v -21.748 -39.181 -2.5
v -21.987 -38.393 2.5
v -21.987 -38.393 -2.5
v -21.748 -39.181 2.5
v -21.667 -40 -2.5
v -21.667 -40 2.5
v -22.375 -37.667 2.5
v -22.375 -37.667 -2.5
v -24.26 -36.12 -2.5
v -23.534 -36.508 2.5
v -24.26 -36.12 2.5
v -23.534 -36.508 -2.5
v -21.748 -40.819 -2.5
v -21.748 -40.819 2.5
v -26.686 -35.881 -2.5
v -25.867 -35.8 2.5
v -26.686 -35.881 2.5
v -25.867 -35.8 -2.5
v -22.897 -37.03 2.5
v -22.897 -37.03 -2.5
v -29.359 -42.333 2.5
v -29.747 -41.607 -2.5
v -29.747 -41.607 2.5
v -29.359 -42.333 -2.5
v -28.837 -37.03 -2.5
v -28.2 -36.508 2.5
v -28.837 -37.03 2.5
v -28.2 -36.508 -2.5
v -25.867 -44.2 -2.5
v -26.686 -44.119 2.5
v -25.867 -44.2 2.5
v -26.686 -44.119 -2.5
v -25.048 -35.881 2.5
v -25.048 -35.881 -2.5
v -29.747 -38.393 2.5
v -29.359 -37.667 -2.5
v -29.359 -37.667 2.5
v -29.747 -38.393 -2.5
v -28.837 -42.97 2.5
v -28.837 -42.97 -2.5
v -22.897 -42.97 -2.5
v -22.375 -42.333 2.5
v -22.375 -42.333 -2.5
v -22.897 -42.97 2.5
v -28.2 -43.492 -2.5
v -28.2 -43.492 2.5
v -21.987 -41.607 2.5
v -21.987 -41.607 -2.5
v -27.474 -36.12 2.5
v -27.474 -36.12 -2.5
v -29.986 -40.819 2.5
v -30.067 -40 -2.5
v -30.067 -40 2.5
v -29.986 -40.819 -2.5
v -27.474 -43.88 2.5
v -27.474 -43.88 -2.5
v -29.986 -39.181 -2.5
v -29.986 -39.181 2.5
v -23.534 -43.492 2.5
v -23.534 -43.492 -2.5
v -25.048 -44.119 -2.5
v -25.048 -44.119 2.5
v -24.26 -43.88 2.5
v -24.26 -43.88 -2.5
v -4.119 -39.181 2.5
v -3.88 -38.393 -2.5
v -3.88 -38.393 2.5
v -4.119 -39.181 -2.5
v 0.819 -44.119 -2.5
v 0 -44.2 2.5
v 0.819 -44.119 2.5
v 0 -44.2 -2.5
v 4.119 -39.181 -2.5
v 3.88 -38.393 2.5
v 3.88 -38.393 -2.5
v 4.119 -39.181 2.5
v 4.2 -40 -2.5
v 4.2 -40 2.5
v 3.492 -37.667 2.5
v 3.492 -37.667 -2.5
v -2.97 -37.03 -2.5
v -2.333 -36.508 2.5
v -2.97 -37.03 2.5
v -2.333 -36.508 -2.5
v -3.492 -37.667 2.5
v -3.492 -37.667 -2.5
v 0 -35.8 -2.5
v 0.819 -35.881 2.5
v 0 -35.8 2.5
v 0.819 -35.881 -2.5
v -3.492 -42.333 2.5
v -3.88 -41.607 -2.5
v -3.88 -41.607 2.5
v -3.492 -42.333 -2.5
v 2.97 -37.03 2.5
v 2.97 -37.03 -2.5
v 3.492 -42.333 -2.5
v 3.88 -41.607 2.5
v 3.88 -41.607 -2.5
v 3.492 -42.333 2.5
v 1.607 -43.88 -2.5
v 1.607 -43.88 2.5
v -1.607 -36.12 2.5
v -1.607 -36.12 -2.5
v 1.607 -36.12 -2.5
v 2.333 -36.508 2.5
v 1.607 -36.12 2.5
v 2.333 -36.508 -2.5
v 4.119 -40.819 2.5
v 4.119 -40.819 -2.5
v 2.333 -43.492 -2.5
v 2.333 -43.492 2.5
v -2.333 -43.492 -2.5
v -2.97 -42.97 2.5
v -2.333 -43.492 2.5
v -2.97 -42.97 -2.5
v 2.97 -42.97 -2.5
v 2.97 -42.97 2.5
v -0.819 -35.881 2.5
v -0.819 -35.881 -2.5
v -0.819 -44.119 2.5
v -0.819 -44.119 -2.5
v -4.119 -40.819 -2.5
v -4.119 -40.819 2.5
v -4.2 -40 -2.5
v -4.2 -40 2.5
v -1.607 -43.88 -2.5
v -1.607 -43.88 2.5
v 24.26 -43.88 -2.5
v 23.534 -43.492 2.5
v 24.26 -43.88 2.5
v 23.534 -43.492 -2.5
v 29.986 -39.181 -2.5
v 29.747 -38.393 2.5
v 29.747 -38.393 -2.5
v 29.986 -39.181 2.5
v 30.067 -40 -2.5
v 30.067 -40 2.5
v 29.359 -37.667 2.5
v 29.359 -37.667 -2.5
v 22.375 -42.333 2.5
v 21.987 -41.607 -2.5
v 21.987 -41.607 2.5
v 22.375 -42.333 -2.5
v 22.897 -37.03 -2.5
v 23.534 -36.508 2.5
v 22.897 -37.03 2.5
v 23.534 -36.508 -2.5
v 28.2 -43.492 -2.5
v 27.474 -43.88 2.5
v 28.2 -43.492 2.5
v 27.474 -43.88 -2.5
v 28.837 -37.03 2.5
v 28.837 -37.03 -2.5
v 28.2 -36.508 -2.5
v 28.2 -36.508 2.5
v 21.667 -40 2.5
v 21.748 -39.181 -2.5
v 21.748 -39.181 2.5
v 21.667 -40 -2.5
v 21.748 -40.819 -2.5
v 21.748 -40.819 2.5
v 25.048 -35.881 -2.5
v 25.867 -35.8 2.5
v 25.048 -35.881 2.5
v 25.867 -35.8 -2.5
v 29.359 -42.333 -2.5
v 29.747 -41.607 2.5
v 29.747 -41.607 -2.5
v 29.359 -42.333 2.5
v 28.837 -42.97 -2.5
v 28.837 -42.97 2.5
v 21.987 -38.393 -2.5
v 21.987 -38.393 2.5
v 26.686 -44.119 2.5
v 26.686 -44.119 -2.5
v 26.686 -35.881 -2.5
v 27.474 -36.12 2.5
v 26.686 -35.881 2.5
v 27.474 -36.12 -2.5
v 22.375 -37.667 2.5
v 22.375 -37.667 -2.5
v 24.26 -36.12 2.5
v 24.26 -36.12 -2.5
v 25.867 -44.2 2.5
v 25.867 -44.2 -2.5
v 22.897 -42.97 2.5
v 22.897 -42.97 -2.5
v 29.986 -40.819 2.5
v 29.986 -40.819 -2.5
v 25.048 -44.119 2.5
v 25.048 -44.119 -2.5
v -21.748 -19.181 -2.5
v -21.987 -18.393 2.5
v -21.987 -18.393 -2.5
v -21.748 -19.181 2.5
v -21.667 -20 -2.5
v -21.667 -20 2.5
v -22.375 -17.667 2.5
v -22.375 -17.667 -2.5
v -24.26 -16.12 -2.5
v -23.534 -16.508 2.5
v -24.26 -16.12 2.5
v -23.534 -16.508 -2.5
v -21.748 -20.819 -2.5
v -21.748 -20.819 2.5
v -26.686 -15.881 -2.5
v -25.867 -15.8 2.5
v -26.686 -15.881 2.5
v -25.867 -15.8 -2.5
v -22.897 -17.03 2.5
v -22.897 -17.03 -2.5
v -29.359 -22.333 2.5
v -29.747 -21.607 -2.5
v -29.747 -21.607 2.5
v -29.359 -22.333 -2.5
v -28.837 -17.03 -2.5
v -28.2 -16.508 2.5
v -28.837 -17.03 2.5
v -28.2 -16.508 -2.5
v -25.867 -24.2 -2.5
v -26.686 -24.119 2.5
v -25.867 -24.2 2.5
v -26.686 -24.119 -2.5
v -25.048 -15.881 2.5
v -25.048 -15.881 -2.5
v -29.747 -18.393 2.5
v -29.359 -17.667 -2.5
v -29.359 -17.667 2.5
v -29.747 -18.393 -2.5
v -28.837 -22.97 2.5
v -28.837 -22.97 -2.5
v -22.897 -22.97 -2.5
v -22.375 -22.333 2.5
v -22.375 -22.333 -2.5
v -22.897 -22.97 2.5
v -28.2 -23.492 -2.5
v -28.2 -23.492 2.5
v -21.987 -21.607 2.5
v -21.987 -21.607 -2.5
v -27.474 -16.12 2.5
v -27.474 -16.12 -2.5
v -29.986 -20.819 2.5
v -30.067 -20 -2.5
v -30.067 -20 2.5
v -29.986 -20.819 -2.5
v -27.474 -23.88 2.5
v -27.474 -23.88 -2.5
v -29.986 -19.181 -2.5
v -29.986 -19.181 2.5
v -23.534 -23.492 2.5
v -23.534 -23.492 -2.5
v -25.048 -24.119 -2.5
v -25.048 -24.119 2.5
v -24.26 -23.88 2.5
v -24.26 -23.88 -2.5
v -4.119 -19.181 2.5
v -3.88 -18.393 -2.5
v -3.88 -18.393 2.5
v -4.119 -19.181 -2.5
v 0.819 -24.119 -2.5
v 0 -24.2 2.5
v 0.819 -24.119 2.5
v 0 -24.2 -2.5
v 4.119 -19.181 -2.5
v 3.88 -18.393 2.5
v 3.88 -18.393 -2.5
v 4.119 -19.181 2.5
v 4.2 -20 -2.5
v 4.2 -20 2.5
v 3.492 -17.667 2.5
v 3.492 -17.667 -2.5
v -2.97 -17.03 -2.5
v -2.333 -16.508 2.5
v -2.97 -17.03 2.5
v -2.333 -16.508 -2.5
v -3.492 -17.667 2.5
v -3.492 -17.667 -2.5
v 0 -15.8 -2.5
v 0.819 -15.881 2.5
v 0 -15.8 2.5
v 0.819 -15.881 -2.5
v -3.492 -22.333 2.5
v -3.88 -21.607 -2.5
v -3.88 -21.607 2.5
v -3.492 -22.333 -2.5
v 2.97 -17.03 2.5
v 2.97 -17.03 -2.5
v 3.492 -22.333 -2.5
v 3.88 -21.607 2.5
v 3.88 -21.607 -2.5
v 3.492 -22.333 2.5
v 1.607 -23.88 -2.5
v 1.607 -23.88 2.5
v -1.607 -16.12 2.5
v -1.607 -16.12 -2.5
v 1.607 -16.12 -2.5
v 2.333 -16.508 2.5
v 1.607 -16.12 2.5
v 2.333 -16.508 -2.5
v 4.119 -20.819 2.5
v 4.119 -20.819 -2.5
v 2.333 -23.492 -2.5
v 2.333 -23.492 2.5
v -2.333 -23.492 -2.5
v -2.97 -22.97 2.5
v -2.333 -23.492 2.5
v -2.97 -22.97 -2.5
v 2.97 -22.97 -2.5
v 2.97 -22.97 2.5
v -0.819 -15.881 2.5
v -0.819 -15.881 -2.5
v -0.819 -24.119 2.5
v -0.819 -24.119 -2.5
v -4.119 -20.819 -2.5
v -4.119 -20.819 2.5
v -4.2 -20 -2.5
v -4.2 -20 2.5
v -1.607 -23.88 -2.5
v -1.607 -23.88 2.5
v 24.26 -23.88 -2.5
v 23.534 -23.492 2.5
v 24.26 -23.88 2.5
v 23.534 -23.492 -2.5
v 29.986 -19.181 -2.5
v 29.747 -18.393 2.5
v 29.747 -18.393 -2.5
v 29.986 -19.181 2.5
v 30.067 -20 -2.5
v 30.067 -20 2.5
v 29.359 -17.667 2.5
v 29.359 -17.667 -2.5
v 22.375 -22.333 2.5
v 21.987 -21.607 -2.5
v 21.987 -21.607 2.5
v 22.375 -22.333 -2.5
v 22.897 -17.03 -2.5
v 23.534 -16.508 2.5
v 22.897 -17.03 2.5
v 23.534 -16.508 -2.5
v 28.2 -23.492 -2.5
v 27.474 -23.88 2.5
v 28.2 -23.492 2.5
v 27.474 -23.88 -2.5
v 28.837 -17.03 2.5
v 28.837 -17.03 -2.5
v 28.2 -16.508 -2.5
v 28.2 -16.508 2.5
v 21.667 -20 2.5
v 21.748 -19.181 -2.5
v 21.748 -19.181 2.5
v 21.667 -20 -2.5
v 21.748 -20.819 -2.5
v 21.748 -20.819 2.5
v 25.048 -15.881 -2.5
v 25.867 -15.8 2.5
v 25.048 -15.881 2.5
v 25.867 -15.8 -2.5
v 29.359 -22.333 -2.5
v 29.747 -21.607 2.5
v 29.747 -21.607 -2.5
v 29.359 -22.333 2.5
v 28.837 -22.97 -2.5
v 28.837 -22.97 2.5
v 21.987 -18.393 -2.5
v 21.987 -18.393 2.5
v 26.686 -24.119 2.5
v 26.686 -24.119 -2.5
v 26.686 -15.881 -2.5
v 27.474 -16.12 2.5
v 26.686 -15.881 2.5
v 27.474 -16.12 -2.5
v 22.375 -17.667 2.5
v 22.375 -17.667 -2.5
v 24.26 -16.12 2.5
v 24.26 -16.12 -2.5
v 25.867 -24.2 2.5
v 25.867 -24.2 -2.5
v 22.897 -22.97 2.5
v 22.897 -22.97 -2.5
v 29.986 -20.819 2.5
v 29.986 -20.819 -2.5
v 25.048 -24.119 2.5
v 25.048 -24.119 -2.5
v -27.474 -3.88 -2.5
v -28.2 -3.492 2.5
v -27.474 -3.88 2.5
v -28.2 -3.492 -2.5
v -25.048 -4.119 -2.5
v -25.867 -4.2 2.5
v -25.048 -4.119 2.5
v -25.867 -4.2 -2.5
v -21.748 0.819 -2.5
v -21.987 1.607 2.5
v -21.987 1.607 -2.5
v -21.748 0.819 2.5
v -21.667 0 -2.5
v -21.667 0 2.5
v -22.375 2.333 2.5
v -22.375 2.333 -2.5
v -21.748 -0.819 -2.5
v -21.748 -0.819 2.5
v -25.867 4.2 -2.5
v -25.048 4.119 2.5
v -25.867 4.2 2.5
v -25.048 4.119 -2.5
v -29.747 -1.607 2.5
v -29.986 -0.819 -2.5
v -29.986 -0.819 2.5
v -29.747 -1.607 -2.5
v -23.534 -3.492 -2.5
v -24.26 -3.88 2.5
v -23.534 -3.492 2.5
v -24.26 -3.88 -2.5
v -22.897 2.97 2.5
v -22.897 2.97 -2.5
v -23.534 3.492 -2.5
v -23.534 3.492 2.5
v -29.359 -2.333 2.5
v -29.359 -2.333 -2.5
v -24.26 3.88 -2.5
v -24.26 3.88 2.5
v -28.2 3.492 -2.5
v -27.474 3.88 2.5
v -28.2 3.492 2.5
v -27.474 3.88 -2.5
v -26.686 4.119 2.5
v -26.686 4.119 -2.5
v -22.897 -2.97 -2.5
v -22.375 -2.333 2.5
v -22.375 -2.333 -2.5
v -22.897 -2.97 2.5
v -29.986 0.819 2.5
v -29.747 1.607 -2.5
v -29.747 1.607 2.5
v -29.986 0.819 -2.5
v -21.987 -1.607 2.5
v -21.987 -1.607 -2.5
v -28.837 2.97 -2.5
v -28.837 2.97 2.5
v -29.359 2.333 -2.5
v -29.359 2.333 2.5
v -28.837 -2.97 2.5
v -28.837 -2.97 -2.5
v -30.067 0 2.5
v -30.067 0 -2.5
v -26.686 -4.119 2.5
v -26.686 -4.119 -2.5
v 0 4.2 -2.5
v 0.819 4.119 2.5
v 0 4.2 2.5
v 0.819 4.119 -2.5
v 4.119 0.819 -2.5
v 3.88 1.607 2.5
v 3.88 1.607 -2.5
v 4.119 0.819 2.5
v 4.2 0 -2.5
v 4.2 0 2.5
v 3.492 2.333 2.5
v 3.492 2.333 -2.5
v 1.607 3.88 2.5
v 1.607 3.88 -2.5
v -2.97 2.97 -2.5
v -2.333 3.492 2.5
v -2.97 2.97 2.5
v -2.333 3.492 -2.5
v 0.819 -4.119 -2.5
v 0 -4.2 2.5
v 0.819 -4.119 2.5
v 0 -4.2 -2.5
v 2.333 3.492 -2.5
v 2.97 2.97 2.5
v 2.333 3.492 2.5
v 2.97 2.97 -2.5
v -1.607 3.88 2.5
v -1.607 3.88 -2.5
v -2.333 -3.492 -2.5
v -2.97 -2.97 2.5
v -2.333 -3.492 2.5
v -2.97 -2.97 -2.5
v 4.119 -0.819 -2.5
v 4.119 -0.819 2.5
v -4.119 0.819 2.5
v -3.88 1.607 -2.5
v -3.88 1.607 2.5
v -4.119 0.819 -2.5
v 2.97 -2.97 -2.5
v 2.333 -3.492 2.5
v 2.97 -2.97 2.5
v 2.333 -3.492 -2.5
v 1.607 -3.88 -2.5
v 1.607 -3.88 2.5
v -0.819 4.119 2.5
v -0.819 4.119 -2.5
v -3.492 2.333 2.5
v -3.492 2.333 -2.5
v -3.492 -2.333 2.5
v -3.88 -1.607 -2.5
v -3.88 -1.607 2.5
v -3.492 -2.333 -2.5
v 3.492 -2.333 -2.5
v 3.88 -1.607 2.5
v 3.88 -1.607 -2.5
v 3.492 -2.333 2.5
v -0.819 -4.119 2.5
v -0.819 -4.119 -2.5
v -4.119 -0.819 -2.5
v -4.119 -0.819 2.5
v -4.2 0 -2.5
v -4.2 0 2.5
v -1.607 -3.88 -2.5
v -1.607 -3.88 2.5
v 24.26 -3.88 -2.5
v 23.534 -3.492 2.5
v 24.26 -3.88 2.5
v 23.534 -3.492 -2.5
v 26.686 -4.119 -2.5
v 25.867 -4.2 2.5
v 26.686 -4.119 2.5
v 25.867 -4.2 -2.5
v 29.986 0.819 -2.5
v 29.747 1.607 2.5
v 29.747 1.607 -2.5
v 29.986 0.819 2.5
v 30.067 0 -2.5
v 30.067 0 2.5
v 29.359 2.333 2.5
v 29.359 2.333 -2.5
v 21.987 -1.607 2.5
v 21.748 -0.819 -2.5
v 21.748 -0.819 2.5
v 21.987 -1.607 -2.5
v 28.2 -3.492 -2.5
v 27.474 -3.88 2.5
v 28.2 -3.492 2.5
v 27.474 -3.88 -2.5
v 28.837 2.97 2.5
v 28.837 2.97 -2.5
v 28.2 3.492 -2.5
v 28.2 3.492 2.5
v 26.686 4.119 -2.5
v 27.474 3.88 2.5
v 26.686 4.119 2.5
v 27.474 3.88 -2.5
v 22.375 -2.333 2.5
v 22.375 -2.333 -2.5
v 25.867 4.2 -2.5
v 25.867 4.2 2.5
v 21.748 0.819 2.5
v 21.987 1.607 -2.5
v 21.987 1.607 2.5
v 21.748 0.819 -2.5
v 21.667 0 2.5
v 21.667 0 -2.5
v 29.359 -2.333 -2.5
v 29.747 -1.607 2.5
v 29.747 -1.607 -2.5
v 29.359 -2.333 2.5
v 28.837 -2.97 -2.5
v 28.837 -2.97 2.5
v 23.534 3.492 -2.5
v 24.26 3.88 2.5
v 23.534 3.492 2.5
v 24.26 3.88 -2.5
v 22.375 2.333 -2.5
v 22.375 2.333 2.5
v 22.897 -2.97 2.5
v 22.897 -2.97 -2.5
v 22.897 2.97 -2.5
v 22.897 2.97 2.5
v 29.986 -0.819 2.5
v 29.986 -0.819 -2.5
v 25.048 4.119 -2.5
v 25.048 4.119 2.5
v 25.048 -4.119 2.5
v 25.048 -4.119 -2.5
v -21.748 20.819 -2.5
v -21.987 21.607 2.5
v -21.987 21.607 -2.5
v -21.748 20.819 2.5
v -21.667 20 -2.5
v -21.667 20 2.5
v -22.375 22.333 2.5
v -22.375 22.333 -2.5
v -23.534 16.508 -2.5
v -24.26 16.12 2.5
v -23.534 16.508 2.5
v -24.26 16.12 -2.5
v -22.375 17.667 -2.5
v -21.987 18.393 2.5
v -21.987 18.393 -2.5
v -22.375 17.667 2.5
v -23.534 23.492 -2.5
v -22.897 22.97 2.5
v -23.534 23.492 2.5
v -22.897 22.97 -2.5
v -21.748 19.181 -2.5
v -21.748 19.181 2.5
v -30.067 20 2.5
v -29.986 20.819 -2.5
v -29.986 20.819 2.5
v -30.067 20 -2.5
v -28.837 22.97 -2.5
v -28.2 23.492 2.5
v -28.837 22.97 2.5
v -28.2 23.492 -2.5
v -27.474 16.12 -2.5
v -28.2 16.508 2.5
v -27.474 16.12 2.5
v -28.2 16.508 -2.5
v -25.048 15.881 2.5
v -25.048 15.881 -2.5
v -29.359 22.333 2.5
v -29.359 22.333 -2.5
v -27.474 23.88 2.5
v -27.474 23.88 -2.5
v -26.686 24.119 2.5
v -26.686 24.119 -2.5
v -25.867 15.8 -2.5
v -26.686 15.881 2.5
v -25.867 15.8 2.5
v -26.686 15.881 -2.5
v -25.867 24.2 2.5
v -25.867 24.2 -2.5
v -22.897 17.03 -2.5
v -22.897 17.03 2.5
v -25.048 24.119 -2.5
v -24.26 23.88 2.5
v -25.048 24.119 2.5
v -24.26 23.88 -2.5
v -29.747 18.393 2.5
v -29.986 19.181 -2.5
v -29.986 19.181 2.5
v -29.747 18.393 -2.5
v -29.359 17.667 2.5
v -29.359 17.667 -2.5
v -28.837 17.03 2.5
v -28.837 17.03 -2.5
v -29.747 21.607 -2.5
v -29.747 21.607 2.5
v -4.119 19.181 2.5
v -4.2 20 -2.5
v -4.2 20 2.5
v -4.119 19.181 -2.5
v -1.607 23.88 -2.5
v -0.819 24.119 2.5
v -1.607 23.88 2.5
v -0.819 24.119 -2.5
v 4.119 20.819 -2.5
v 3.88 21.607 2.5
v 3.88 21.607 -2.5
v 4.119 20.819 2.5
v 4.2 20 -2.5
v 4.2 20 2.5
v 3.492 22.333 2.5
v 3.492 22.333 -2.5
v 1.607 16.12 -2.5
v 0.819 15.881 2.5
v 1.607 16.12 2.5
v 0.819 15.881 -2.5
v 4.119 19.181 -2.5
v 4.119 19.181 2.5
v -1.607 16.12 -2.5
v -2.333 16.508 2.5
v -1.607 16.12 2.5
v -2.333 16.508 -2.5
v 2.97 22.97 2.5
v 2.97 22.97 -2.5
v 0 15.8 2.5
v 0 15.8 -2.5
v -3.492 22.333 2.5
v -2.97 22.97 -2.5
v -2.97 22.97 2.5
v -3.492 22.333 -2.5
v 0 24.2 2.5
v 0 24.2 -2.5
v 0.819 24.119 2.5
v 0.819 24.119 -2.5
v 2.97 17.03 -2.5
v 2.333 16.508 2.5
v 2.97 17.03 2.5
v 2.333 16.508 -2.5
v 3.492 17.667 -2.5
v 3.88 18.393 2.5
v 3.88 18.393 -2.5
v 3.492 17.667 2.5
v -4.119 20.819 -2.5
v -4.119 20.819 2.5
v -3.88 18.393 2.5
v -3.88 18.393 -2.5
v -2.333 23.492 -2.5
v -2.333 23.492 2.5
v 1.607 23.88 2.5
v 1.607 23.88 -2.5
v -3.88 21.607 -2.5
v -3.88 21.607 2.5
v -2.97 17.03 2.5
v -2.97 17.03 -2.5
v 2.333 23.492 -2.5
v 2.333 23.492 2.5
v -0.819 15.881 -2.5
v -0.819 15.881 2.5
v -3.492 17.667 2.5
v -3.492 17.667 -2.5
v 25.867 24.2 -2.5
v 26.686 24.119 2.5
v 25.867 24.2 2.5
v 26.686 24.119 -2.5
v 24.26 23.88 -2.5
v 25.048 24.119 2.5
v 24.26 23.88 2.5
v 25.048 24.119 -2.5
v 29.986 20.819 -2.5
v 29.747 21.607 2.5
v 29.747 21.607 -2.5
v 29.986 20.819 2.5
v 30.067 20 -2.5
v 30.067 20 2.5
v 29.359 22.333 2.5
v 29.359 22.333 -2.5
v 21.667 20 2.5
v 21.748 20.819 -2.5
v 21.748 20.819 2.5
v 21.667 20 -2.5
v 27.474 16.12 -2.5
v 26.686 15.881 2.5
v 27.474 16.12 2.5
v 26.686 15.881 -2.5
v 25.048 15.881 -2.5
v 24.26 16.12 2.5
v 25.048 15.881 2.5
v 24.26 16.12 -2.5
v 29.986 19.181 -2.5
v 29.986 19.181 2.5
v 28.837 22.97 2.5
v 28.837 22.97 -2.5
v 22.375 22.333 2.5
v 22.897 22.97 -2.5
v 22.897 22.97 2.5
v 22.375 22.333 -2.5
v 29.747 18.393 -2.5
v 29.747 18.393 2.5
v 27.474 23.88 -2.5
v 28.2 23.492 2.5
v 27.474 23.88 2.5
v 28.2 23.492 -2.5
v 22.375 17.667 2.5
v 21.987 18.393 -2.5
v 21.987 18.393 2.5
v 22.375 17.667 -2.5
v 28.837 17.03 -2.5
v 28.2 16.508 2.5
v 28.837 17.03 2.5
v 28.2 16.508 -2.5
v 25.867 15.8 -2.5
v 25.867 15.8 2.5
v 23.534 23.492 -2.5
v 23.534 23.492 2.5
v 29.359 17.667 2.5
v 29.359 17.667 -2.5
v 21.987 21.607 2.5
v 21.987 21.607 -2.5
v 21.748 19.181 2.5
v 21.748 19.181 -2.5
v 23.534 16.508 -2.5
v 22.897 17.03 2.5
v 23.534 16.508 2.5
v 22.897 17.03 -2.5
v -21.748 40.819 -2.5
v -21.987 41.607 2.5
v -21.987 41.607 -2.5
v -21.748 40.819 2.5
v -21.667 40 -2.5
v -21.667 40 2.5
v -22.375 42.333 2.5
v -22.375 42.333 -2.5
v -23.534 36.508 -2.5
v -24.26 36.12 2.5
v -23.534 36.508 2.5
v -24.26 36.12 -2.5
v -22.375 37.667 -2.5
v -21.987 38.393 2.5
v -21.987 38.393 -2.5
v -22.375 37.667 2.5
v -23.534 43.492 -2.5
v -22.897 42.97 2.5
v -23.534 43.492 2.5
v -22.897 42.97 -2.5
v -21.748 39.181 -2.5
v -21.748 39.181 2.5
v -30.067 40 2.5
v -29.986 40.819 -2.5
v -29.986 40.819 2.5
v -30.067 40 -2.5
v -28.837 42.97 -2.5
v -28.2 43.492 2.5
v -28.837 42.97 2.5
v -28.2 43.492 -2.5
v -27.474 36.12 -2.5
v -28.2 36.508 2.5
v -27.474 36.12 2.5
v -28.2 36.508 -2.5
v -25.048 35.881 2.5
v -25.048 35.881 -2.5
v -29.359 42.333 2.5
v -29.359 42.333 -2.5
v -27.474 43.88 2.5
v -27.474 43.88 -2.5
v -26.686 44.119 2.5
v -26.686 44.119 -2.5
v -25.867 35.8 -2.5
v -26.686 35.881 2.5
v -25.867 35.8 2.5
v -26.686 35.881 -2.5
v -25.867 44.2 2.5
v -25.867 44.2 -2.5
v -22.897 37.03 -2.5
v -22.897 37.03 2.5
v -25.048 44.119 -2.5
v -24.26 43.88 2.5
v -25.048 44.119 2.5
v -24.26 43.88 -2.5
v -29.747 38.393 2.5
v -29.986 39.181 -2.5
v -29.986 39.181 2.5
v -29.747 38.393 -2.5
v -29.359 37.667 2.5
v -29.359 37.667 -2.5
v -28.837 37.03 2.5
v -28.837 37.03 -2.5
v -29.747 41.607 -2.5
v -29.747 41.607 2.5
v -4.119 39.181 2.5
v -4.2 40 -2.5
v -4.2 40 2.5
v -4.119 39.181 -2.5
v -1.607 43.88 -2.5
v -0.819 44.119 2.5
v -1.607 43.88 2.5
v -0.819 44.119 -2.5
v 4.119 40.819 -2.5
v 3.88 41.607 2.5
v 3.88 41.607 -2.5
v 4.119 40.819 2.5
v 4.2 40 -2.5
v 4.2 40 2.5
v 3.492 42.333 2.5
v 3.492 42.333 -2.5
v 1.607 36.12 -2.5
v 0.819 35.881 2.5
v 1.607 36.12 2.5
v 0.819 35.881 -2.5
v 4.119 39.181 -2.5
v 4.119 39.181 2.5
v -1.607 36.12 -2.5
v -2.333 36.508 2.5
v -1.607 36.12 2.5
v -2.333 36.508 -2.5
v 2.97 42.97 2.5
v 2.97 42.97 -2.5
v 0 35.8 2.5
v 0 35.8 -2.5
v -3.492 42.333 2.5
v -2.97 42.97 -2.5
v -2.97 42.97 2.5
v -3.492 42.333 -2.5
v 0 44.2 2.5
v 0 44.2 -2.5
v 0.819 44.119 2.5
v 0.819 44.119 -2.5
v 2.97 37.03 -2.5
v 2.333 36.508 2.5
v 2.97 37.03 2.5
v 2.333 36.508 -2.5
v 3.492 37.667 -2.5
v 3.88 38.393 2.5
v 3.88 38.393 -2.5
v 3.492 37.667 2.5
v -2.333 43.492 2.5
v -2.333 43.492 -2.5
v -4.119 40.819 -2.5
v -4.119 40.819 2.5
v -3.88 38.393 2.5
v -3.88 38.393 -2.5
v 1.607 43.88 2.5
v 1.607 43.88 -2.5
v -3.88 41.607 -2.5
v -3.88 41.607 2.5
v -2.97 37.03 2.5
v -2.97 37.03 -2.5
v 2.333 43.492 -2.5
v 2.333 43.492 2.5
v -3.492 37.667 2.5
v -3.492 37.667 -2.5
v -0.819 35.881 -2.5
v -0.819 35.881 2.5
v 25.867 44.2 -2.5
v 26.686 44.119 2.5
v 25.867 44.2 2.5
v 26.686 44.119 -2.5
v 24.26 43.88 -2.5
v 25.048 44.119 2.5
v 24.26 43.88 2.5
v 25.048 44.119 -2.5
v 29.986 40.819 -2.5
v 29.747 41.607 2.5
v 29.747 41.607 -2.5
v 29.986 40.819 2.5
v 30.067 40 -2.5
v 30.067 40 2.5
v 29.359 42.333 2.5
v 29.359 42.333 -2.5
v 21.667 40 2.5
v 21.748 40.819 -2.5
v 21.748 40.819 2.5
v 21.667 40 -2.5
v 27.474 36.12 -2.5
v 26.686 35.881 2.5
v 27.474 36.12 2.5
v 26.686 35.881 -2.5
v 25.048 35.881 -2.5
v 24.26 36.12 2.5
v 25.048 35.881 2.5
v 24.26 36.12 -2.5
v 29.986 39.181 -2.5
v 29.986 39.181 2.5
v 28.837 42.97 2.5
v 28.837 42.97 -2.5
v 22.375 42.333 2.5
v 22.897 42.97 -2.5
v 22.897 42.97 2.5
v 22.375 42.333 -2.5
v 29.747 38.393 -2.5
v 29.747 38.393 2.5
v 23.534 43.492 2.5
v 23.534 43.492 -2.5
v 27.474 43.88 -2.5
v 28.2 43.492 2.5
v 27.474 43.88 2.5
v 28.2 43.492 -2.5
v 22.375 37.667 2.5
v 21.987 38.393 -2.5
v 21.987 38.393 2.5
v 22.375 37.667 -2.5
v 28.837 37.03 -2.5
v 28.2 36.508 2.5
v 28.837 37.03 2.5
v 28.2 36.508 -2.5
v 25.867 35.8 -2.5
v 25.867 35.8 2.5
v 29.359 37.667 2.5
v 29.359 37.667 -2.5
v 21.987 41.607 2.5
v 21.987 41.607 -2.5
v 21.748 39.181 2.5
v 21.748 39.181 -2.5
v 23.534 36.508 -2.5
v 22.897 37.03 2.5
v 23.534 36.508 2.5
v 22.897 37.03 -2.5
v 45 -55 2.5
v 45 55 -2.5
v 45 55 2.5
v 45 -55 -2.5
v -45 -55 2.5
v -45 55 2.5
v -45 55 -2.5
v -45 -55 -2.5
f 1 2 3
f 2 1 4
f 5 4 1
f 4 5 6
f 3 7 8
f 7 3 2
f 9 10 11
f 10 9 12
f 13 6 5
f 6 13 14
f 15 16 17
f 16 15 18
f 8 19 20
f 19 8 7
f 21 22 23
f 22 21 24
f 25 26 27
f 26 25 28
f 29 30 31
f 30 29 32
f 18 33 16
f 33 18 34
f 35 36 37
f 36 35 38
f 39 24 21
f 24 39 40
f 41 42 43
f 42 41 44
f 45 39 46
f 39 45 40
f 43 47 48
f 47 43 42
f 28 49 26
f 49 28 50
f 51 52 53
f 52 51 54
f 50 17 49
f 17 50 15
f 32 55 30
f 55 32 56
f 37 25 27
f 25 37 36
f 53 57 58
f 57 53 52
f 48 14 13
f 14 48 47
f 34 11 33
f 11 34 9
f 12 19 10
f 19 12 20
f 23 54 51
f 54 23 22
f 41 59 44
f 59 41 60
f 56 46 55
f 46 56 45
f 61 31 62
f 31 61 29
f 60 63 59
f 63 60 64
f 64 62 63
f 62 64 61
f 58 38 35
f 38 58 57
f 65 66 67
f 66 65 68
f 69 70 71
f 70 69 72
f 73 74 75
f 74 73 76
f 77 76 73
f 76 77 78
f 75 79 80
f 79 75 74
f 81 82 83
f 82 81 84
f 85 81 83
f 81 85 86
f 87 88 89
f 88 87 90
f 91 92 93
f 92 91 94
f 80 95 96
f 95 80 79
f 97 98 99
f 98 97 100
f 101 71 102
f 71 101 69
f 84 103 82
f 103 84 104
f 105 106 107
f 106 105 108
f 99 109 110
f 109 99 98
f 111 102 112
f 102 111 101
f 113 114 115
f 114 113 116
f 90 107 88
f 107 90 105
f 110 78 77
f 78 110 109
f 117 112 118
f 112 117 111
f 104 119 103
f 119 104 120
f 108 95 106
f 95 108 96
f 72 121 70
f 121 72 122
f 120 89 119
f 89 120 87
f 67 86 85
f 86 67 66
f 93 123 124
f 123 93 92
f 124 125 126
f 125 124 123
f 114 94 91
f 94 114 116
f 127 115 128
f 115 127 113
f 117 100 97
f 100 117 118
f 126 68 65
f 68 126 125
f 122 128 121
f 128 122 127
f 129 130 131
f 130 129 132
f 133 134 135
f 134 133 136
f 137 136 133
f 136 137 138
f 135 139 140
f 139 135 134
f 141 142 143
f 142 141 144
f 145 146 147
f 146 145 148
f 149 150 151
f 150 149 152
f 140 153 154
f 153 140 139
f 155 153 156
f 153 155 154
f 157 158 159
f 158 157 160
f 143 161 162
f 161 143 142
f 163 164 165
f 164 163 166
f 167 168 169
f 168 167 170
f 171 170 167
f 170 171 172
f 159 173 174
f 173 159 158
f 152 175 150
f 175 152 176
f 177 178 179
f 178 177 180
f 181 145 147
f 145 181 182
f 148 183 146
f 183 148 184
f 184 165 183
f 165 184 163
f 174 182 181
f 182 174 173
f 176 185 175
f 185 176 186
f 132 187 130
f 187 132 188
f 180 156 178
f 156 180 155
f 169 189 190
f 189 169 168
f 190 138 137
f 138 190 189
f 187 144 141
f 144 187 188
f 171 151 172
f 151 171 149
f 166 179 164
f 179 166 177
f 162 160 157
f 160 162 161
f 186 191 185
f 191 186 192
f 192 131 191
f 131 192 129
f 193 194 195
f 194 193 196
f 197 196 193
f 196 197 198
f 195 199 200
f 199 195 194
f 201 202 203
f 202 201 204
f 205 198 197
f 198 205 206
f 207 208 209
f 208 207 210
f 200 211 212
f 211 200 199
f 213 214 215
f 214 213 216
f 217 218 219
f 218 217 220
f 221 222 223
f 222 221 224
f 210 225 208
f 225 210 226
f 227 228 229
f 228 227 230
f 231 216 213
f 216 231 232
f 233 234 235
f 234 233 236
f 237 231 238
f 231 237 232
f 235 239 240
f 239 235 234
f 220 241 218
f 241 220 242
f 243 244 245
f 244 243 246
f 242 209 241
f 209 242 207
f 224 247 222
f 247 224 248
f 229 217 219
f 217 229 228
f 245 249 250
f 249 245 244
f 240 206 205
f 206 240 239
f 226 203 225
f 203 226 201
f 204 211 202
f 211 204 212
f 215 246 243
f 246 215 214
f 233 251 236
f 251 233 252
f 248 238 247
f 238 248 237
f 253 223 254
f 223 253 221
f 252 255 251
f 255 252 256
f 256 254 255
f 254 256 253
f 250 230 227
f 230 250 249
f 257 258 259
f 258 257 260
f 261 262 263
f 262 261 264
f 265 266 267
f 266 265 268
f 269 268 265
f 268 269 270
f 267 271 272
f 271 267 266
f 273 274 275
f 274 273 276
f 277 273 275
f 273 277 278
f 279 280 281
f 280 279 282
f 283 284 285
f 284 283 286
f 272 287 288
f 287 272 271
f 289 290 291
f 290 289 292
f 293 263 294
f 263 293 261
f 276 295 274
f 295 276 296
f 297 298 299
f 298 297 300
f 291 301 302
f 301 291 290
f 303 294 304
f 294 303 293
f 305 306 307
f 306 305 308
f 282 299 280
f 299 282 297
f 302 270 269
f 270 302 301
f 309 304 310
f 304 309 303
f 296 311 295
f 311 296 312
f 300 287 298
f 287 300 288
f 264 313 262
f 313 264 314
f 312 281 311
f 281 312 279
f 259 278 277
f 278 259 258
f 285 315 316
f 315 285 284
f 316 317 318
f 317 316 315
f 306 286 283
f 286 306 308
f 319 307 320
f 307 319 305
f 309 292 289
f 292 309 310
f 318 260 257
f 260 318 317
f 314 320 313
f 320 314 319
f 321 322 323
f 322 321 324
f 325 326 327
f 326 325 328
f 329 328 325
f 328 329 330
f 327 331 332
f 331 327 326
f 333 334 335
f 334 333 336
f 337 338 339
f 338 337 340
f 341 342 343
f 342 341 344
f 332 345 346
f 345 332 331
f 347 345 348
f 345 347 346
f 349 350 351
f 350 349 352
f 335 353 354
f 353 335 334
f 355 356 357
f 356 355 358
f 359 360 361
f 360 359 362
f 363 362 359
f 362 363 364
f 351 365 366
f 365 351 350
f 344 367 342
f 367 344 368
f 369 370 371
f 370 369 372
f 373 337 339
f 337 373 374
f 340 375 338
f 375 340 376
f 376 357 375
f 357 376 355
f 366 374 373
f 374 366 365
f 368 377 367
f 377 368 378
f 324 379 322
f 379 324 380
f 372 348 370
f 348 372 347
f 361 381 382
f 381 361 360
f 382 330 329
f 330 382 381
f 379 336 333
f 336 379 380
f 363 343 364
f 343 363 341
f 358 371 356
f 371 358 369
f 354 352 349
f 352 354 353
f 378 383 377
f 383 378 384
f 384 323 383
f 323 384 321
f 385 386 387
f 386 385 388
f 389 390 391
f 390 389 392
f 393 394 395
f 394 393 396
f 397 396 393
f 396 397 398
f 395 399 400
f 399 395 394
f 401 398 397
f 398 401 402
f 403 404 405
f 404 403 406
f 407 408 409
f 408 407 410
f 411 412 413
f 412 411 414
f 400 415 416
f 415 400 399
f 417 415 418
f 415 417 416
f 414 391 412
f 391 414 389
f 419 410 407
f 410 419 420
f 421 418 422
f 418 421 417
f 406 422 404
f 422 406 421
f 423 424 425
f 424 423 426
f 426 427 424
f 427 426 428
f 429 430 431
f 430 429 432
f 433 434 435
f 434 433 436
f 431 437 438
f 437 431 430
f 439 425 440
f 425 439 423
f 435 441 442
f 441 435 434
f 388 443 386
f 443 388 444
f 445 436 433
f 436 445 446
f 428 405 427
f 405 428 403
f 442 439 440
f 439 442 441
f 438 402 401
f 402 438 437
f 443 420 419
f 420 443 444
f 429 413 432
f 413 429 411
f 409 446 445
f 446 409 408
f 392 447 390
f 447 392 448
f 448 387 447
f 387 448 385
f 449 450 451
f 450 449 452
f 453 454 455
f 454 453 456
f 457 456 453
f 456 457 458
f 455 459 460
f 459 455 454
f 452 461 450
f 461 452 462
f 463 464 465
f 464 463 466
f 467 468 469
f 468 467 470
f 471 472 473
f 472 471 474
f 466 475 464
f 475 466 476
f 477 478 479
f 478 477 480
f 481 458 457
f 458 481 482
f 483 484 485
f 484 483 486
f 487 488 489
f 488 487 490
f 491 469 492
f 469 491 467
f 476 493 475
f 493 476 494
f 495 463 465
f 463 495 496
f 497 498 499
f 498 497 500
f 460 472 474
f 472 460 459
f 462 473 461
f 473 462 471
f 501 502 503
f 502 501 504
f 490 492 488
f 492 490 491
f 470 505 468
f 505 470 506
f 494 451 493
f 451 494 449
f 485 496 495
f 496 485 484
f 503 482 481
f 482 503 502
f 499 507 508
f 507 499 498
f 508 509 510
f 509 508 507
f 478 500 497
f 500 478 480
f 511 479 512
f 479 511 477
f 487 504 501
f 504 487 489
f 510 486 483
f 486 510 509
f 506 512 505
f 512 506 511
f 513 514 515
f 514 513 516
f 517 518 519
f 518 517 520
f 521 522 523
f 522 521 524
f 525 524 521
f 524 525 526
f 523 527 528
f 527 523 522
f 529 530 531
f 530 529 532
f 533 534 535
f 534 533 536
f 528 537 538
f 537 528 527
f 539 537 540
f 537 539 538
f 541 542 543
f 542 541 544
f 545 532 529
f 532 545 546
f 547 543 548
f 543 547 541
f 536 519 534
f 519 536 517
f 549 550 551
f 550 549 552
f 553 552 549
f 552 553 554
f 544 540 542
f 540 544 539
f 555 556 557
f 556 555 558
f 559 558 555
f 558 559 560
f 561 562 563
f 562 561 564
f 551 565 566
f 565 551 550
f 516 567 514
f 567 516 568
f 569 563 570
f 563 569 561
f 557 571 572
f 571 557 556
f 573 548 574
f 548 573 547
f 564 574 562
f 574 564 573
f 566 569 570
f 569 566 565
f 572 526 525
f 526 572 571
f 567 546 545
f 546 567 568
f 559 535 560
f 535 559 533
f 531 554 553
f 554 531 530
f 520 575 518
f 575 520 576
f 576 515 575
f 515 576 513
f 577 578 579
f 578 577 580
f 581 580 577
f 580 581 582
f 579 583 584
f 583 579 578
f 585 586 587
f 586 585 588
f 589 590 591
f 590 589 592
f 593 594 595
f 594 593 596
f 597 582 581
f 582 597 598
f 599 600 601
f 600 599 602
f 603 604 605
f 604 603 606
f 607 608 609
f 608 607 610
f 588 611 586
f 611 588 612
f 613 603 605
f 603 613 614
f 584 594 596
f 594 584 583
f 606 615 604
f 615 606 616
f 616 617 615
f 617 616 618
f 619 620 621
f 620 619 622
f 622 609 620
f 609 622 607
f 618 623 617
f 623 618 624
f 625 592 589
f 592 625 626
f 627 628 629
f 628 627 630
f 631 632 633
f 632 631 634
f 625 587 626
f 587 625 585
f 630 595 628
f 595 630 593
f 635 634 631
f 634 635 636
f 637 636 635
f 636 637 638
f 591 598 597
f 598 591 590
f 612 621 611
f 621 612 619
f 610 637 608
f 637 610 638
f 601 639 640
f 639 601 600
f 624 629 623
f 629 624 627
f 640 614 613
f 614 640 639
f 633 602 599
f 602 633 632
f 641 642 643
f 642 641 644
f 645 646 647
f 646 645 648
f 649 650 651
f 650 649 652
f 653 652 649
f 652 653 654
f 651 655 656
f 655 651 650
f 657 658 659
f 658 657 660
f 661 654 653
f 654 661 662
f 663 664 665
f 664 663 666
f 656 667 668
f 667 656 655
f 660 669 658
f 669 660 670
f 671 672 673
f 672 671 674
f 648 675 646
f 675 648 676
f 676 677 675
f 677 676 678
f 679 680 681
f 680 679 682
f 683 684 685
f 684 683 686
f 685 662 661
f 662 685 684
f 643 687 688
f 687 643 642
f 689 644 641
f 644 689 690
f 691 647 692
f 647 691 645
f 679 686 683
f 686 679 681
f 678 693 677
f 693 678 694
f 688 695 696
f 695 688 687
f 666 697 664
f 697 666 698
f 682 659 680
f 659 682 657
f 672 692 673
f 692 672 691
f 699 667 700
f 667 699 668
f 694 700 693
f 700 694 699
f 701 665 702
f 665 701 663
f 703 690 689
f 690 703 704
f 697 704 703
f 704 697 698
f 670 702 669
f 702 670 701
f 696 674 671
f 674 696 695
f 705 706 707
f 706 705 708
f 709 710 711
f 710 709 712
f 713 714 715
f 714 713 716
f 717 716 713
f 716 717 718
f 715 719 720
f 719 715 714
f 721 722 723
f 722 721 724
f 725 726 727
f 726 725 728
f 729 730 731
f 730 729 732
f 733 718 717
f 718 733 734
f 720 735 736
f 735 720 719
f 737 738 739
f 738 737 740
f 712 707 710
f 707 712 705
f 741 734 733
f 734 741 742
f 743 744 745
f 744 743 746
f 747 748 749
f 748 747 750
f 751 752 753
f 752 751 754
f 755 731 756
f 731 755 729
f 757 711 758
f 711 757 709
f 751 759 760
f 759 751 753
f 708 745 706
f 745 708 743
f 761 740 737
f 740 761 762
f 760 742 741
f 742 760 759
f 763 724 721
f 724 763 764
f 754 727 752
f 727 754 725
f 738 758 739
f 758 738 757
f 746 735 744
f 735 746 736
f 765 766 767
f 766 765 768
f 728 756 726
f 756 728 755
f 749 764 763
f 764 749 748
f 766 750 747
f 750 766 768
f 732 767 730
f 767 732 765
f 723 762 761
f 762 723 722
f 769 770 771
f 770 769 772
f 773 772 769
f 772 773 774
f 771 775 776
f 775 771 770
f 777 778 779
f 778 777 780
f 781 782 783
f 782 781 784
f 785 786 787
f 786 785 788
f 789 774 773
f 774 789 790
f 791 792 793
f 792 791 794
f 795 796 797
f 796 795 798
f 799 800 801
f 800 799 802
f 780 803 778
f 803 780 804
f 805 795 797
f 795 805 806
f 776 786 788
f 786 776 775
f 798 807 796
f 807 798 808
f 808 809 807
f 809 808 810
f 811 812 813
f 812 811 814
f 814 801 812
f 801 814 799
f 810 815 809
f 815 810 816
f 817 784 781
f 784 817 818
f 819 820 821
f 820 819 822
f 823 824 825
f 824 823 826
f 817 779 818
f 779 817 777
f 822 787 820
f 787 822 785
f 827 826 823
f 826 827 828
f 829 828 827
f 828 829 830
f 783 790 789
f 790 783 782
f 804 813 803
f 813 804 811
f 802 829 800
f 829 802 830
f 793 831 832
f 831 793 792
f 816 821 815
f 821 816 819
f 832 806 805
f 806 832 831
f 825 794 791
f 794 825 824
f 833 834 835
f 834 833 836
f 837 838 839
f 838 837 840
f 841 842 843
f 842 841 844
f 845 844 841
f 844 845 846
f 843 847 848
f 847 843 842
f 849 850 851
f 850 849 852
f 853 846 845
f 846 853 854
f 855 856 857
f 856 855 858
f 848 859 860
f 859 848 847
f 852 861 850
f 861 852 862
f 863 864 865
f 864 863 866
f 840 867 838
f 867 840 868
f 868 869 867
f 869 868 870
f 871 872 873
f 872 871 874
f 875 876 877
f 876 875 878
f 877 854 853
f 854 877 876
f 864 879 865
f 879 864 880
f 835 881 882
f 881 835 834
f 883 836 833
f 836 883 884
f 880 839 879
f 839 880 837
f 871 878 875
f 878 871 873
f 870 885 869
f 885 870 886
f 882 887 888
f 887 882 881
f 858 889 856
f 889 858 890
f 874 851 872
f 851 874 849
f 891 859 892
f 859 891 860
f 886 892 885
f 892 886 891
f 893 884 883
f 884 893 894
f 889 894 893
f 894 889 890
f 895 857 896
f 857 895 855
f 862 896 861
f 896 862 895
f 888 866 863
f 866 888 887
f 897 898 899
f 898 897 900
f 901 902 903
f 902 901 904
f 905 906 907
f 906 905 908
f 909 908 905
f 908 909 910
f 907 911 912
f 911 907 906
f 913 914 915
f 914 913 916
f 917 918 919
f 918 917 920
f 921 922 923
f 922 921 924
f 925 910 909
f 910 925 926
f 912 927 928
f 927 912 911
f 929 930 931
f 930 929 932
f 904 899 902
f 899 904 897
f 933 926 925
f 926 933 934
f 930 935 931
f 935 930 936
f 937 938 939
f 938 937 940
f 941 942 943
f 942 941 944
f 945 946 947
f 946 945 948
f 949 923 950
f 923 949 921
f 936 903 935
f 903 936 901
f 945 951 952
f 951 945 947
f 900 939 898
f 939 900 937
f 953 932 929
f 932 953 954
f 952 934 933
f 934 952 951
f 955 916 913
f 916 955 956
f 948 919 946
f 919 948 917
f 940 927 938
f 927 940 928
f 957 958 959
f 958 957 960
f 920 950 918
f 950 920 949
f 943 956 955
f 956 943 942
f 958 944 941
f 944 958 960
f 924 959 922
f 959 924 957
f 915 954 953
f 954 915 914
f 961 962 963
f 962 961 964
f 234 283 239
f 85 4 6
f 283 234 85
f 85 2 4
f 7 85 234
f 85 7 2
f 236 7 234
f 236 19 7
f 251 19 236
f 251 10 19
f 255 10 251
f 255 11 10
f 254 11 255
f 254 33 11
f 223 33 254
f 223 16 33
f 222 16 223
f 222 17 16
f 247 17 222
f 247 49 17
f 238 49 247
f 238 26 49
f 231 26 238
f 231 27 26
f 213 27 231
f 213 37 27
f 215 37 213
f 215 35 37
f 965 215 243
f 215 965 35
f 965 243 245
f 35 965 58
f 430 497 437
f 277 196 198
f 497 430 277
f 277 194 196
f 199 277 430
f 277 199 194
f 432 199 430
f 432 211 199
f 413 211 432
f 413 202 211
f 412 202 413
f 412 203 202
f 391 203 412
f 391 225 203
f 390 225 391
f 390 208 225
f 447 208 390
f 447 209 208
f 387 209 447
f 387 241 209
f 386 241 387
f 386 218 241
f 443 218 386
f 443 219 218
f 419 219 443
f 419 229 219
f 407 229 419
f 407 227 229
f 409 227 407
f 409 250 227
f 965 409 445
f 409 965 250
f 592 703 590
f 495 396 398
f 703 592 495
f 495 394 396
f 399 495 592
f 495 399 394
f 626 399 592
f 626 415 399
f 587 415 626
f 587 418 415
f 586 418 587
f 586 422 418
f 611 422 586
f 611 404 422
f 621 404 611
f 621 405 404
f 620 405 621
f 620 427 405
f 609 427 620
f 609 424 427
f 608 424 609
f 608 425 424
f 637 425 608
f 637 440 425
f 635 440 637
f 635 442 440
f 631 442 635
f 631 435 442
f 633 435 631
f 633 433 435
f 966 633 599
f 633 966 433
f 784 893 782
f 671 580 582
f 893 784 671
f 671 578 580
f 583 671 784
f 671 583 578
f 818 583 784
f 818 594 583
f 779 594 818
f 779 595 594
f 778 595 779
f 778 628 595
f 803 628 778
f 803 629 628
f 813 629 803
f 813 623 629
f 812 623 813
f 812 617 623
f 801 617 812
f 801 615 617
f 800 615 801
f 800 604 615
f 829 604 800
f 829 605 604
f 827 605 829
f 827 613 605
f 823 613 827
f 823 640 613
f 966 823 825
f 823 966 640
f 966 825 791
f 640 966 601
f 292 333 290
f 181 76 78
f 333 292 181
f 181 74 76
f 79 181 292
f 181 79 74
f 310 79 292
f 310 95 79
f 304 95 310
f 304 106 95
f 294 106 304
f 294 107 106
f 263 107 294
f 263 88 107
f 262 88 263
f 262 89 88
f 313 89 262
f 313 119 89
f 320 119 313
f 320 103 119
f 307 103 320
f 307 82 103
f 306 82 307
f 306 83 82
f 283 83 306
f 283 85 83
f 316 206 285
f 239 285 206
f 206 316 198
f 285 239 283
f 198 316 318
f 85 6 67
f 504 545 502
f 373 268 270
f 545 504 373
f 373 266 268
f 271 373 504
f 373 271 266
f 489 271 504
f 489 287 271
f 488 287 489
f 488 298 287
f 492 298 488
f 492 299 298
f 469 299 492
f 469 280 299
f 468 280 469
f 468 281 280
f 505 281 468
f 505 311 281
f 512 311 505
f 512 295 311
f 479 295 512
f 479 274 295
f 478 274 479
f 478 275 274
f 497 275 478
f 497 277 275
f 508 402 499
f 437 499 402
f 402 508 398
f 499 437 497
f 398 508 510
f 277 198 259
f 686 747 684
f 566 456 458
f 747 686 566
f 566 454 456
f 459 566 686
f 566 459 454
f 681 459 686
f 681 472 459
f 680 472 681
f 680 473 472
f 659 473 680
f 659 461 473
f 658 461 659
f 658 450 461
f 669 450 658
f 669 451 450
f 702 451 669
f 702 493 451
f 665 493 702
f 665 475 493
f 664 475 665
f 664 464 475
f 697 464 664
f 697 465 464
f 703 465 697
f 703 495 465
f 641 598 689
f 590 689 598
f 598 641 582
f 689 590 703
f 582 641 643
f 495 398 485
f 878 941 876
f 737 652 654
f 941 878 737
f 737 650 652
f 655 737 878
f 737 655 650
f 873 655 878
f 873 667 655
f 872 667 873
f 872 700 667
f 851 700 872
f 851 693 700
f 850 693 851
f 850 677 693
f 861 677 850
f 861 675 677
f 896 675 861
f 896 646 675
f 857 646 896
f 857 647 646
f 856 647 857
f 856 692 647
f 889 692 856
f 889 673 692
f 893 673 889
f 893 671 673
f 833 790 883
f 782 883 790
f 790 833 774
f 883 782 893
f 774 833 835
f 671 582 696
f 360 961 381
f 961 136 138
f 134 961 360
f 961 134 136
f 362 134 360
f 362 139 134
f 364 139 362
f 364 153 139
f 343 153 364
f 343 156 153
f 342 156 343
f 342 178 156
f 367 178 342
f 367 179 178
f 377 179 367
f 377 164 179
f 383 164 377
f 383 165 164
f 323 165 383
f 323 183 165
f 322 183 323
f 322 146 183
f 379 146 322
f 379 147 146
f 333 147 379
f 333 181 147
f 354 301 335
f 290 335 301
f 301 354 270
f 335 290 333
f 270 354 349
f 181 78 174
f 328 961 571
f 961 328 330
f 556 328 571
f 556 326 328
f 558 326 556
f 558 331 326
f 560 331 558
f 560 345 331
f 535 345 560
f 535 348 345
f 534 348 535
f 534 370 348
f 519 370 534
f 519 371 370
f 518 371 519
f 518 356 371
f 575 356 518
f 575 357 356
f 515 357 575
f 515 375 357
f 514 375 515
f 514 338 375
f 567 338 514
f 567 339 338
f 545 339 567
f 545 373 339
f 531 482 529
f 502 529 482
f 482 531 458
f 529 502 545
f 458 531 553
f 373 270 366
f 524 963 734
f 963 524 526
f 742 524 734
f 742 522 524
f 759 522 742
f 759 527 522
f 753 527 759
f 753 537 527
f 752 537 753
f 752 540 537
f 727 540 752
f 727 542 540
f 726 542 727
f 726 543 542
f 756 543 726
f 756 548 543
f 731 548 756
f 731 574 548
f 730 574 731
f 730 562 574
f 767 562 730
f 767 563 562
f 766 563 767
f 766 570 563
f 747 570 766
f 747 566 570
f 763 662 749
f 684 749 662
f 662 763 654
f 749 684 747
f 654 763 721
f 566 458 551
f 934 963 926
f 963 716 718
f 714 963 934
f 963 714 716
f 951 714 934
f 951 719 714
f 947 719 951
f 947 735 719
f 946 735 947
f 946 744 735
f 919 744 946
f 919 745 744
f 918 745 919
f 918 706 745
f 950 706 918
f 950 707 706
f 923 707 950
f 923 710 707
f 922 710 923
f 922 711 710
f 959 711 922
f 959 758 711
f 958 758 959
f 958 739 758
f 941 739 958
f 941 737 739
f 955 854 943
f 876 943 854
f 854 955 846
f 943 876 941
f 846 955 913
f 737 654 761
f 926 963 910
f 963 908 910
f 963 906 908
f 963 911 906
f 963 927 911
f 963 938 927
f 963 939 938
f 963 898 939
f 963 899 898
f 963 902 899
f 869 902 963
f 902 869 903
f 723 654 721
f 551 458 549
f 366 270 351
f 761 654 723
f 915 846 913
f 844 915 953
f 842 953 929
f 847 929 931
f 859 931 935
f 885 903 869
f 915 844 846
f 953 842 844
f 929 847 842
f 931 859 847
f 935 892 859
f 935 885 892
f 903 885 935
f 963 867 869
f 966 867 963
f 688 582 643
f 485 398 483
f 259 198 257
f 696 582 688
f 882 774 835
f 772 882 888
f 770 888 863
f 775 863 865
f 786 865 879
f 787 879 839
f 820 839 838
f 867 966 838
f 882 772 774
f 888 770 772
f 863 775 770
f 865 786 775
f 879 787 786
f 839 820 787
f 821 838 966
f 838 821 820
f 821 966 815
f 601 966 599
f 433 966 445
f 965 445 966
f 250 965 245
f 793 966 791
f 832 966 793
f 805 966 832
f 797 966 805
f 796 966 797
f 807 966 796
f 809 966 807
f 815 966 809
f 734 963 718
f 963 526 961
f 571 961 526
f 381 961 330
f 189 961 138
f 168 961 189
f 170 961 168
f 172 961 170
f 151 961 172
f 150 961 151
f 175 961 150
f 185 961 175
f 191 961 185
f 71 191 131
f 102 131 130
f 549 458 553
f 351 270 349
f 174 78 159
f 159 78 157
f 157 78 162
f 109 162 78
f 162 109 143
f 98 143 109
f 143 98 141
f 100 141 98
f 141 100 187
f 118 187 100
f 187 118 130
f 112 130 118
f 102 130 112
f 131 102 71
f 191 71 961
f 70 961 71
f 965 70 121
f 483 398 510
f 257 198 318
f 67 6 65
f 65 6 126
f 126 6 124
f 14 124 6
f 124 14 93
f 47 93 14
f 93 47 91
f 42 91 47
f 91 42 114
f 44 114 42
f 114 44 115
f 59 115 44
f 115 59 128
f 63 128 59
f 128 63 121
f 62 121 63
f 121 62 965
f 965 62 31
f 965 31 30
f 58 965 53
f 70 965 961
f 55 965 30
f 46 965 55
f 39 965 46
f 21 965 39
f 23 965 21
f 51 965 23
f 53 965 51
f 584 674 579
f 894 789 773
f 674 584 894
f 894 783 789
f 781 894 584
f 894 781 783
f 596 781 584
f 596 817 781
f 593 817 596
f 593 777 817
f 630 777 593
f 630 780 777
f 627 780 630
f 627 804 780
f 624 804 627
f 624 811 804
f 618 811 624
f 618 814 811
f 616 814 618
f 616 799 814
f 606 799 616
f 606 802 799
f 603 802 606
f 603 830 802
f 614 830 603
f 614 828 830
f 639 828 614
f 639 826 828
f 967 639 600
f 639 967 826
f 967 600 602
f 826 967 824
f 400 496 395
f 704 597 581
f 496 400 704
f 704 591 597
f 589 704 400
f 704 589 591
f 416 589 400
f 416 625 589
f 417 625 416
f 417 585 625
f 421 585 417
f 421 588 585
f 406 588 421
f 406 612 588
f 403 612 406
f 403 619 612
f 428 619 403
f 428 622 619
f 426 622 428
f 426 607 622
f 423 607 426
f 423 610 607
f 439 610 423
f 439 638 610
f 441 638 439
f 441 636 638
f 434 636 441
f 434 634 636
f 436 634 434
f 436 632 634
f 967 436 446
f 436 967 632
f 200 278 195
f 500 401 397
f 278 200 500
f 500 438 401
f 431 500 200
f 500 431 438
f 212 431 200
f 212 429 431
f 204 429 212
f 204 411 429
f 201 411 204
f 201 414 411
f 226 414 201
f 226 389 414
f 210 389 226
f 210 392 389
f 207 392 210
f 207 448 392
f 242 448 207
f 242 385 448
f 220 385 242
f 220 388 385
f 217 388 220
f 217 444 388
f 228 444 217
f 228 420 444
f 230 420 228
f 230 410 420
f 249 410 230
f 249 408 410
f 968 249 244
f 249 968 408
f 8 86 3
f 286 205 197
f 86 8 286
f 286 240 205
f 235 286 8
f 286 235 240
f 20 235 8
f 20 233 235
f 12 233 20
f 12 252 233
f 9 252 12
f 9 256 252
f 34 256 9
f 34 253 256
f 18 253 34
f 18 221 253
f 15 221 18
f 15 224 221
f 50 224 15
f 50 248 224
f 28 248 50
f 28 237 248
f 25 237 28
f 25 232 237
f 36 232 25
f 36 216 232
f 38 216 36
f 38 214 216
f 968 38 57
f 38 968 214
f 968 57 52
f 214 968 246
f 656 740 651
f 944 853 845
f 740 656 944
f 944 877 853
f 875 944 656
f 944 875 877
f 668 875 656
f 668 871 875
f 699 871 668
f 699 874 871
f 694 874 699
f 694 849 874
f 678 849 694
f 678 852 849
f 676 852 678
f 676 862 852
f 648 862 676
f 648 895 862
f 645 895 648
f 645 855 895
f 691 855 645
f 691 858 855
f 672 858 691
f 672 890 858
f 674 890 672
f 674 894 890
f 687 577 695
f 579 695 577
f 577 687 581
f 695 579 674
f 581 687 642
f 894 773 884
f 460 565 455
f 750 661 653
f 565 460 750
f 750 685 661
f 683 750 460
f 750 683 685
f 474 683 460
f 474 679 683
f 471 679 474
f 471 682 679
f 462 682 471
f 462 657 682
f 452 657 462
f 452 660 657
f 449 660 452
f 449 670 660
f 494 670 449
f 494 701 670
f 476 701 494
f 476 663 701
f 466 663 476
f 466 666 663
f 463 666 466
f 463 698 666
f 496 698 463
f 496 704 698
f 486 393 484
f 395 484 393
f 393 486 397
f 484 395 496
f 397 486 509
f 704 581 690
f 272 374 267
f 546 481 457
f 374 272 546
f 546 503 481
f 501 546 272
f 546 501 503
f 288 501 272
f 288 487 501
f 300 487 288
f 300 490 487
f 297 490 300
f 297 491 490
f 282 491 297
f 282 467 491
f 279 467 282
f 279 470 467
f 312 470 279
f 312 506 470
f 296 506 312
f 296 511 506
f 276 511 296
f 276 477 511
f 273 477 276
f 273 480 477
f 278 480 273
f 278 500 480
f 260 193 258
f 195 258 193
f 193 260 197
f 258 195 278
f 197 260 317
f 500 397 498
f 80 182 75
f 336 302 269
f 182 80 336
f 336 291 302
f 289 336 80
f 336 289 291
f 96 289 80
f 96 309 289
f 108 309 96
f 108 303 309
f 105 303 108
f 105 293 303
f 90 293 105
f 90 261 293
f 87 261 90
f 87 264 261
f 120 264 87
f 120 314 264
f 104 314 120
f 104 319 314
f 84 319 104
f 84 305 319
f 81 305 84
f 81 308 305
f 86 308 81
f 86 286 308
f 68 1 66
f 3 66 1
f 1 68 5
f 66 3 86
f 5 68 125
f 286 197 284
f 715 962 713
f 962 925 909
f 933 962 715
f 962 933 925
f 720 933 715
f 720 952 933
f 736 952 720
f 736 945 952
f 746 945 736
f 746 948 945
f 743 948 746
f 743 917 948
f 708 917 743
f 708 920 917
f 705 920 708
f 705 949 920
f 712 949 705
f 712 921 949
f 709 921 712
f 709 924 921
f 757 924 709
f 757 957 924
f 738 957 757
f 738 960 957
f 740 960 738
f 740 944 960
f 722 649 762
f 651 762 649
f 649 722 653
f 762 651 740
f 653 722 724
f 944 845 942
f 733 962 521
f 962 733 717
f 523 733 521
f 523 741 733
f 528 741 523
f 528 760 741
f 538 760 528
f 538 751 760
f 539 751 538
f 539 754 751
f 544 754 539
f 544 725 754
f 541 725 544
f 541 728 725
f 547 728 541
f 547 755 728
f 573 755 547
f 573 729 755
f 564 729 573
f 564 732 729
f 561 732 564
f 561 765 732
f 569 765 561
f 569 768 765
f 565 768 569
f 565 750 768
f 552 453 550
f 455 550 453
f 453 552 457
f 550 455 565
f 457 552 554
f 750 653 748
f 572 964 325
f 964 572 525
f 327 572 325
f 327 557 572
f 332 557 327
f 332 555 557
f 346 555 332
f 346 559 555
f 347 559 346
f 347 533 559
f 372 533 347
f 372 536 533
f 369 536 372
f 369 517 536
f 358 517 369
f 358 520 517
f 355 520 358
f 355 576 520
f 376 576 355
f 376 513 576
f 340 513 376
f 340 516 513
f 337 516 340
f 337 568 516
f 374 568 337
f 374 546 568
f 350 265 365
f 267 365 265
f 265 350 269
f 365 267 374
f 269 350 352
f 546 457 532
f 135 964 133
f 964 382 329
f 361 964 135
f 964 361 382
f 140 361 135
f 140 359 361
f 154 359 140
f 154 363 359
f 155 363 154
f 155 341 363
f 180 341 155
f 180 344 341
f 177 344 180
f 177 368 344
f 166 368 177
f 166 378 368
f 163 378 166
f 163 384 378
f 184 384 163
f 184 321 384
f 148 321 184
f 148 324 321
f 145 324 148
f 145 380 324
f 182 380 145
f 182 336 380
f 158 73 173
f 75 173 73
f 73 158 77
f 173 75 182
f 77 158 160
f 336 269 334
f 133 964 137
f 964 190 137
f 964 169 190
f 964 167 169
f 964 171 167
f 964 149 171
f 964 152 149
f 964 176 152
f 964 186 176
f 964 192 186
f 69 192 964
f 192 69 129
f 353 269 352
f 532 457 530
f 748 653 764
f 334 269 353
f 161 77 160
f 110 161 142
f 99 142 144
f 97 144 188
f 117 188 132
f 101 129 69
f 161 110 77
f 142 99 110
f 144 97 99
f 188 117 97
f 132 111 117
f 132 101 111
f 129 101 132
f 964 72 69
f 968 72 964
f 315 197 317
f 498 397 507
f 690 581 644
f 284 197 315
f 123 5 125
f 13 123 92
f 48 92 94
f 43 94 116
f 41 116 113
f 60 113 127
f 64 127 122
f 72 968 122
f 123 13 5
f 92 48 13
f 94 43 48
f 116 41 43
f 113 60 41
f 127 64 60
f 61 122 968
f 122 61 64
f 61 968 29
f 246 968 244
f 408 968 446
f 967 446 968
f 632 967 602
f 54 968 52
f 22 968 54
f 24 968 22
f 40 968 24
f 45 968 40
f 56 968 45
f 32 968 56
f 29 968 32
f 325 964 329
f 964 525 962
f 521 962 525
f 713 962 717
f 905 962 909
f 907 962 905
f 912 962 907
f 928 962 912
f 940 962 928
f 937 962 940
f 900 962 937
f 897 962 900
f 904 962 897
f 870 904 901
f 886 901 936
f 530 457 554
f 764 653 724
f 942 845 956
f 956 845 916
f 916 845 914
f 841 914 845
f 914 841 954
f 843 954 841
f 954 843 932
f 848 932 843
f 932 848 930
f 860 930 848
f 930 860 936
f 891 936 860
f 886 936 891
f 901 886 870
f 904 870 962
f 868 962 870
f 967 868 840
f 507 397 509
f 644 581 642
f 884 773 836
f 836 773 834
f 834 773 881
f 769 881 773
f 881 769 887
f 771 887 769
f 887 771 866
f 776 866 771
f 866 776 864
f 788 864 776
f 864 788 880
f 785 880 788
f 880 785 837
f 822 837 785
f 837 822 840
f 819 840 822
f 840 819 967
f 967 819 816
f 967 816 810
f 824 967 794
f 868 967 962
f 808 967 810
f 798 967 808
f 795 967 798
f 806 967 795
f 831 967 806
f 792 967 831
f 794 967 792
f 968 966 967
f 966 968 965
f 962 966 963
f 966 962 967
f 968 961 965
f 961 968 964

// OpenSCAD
$fn = 32;

// ----------------------------------------------------------------------
// Perforated panel 90 x 110 x 5
// 5 x 3 Ø8.4 holes, grid layout
// ----------------------------------------------------------------------

// --- parameters (mm) ---
panel = [90, 110, 5];  // overall size (x, y, z)
hole_d = 8.4;          // hole diameter
pitch_x = 25.867;      // hole pitch along X
pitch_y = 20;          // hole pitch along Y

// --- derived feature positions (mm) ---
margin = hole_d / 2 + 2;            // = 6.2   clearance from the panel edge
cols = floor((panel[0] - 2 * margin) / pitch_x) + 1;  // = 3   how many columns fit in X
rows = floor((panel[1] - 2 * margin) / pitch_y) + 1;  // = 5   how many rows fit in Y
span_x = (cols - 1) * pitch_x + 0;  // = 51.73   width of the field
span_y = (rows - 1) * pitch_y;      // = 80   height of the field
origin_x = -span_x / 2;             // = -25.87   X of the first hole
origin_y = -span_y / 2;             // = -40   Y of the first row
holes = rows * cols;                // = 15   holes in total
feature_centers = [
  [origin_x + 0 * pitch_x, origin_y + 0 * pitch_y],
  [origin_x + 1 * pitch_x, origin_y + 0 * pitch_y],
  [origin_x + 2 * pitch_x, origin_y + 0 * pitch_y],
  [origin_x + 0 * pitch_x, origin_y + 1 * pitch_y],
  [origin_x + 1 * pitch_x, origin_y + 1 * pitch_y],
  [origin_x + 2 * pitch_x, origin_y + 1 * pitch_y],
  [origin_x + 0 * pitch_x, origin_y + 2 * pitch_y],
  [origin_x + 1 * pitch_x, origin_y + 2 * pitch_y],
  [origin_x + 2 * pitch_x, origin_y + 2 * pitch_y],
  [origin_x + 0 * pitch_x, origin_y + 3 * pitch_y],
  [origin_x + 1 * pitch_x, origin_y + 3 * pitch_y],
  [origin_x + 2 * pitch_x, origin_y + 3 * pitch_y],
  [origin_x + 0 * pitch_x, origin_y + 4 * pitch_y],
  [origin_x + 1 * pitch_x, origin_y + 4 * pitch_y],
  [origin_x + 2 * pitch_x, origin_y + 4 * pitch_y]
];   // hole centres, used verbatim by the cutter loop

// panel outline, every hole through
difference() {
  cube(panel, center = true);
  for (centre = feature_centers)
    translate([centre[0], centre[1], 0])
      cylinder(d = hole_d, h = panel[2] + 2, center = true);
}
